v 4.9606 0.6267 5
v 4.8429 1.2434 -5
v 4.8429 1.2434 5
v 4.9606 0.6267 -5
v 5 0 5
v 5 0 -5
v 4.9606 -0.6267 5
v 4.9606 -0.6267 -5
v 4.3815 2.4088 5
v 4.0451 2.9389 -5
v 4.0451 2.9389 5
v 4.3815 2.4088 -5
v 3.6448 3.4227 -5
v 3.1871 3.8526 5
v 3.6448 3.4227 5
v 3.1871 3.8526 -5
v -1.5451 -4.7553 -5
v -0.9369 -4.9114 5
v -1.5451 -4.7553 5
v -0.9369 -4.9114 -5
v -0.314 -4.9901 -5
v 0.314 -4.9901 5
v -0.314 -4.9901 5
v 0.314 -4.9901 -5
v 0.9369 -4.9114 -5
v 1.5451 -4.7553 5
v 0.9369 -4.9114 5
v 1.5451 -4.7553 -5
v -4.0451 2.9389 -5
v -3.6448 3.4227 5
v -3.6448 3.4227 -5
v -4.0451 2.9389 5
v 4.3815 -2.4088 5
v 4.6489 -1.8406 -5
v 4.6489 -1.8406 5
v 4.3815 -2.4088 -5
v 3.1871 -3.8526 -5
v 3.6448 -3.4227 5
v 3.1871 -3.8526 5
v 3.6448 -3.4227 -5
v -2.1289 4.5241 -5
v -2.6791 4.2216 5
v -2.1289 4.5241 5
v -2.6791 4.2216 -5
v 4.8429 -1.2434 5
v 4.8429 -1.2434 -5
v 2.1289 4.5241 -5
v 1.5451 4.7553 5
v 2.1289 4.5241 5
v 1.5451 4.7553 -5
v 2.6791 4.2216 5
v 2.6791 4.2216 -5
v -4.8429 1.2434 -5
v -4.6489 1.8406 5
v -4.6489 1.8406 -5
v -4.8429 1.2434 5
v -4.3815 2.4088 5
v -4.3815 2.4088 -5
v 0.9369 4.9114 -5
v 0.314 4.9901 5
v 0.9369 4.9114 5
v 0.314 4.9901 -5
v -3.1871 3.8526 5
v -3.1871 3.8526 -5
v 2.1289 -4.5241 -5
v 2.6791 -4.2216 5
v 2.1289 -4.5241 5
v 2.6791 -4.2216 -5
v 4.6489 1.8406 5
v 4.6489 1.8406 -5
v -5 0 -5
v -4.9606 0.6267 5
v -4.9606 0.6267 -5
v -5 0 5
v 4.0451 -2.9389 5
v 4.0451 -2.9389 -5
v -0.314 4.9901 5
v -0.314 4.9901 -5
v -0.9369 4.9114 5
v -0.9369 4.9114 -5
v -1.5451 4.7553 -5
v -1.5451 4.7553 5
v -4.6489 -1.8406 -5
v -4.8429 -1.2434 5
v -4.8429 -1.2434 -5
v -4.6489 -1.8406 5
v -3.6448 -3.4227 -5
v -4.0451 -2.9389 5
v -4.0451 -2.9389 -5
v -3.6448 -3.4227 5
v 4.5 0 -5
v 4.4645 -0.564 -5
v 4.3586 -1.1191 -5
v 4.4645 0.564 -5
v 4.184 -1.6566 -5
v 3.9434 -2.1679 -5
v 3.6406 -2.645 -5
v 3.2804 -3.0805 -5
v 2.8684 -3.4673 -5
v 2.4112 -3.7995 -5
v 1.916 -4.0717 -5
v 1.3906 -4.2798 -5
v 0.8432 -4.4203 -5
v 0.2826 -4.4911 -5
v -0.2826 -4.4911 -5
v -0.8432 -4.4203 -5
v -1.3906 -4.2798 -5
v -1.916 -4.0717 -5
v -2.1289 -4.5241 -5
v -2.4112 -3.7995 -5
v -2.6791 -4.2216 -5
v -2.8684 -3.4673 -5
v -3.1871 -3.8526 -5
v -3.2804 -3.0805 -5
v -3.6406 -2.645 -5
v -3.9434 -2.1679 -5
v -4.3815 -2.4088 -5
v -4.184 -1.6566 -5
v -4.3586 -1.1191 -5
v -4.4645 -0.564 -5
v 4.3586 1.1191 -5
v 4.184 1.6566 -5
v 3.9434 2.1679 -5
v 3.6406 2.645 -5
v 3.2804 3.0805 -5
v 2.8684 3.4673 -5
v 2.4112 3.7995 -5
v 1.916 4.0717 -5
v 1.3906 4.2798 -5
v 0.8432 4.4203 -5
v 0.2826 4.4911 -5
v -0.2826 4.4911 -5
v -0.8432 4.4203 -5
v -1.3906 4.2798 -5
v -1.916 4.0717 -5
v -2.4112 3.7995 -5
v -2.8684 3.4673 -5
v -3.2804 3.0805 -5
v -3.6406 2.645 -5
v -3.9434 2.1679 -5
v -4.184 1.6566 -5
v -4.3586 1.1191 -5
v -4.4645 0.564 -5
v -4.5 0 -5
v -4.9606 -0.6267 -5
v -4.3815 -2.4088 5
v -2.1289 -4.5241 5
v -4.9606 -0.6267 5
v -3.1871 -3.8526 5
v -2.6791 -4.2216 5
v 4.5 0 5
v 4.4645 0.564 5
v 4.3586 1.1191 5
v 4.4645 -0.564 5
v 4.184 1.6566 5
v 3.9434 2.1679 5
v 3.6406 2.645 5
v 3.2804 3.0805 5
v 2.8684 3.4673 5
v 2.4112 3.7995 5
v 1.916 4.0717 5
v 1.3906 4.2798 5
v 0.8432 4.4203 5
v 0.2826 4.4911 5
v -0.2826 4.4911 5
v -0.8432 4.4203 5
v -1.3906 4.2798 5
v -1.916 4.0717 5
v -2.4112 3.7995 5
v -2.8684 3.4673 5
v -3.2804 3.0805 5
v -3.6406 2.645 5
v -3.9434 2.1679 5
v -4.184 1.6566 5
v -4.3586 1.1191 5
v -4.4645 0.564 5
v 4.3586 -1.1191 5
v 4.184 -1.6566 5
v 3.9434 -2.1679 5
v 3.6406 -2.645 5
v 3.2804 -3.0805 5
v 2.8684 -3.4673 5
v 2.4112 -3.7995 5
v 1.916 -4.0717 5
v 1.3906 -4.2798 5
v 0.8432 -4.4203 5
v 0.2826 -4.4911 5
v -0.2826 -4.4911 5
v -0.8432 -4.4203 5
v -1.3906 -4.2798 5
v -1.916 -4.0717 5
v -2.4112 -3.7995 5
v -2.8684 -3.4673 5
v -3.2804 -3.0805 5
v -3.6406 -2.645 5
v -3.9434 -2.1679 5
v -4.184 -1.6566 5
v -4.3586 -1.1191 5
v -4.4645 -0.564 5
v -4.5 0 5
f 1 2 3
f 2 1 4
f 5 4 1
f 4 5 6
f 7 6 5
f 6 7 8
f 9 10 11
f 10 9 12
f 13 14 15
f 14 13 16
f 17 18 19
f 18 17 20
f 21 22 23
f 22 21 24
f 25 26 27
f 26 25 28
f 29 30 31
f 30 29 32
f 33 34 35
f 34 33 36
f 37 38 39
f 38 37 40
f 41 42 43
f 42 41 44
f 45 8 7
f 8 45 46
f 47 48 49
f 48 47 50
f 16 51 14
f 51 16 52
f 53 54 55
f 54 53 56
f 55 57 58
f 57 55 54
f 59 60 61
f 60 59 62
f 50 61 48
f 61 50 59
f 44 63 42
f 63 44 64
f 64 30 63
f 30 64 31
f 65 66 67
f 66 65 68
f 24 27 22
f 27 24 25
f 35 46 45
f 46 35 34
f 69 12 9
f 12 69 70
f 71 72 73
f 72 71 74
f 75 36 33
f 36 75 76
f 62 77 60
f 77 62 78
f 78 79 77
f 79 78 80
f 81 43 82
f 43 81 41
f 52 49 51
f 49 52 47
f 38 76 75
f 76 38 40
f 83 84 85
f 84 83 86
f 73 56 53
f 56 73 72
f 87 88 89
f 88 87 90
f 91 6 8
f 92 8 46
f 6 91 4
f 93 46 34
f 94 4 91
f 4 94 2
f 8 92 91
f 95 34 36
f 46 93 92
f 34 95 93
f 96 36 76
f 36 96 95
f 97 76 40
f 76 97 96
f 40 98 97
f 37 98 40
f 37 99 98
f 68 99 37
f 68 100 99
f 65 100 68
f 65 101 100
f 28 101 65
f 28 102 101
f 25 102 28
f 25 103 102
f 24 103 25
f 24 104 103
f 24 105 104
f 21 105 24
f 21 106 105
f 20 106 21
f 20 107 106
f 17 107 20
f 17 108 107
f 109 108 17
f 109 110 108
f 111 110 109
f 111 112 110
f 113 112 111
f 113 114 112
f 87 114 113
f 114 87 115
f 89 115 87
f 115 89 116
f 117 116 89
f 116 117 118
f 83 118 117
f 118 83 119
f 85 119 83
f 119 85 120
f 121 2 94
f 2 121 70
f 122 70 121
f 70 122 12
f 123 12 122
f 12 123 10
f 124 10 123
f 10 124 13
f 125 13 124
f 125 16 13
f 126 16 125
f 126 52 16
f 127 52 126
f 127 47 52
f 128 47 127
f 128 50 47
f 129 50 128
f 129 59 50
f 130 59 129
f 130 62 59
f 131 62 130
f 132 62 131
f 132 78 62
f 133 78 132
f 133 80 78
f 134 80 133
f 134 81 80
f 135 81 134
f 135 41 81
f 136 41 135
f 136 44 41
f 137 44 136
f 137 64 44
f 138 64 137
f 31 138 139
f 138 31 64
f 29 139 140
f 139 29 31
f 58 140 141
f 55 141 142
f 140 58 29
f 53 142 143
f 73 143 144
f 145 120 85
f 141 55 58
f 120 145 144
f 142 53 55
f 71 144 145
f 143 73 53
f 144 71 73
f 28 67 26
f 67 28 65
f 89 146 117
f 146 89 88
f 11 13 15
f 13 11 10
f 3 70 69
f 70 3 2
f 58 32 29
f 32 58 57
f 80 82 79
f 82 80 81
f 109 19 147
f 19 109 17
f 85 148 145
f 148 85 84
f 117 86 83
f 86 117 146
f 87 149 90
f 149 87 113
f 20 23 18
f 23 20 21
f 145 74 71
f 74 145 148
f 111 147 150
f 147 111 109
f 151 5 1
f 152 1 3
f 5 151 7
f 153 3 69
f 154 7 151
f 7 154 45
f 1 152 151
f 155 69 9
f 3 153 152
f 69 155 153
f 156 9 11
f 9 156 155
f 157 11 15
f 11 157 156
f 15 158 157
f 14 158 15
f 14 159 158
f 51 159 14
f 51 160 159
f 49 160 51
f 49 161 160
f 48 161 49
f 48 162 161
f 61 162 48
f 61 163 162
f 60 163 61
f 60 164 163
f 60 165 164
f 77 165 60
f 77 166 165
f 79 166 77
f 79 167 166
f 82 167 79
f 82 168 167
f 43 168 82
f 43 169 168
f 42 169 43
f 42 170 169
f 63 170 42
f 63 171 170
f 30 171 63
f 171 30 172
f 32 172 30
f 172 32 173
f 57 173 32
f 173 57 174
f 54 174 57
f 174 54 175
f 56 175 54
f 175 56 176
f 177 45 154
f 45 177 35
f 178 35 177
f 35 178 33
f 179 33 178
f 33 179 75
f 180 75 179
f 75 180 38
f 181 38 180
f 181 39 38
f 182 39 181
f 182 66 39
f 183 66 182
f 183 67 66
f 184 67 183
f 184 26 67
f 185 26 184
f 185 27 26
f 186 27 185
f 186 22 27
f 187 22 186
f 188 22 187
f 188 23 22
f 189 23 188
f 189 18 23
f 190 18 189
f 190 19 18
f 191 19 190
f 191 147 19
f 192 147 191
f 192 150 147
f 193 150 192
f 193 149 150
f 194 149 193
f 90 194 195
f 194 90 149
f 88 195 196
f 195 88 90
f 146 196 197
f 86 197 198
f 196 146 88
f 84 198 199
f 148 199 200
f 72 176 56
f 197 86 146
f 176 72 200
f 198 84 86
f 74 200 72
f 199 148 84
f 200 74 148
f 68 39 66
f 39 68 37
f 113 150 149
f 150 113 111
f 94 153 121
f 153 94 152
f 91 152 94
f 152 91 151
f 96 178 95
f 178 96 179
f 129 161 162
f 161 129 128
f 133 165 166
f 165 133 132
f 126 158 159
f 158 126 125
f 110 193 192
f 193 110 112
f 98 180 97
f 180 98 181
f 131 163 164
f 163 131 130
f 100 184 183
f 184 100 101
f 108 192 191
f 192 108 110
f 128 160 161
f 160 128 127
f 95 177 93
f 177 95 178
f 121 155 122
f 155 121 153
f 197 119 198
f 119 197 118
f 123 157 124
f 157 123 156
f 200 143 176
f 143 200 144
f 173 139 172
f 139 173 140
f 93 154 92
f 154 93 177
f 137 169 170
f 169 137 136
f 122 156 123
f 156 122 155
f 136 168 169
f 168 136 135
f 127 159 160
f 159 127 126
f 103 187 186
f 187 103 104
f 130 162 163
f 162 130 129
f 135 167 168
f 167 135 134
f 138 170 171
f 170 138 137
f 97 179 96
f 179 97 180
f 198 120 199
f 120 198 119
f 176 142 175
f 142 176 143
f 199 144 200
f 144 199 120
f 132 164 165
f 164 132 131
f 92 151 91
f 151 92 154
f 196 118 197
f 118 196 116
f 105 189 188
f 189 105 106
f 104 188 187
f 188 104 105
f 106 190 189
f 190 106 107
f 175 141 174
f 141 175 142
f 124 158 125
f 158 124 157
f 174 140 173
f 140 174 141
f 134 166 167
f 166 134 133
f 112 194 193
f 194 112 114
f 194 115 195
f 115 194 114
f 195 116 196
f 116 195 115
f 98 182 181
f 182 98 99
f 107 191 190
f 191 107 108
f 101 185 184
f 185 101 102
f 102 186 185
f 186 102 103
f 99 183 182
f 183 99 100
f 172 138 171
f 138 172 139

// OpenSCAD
$fn = 50;


difference() {
	union() {
		translate(v = [0, 0, -5.0000000000]) {
			cylinder(h = 10, r = 5.0000000000);
		}
	}
	union() {
		translate(v = [0, 0, -100.0000000000]) {
			cylinder(h = 200, r = 4.5000000000);
		}
	}
}
